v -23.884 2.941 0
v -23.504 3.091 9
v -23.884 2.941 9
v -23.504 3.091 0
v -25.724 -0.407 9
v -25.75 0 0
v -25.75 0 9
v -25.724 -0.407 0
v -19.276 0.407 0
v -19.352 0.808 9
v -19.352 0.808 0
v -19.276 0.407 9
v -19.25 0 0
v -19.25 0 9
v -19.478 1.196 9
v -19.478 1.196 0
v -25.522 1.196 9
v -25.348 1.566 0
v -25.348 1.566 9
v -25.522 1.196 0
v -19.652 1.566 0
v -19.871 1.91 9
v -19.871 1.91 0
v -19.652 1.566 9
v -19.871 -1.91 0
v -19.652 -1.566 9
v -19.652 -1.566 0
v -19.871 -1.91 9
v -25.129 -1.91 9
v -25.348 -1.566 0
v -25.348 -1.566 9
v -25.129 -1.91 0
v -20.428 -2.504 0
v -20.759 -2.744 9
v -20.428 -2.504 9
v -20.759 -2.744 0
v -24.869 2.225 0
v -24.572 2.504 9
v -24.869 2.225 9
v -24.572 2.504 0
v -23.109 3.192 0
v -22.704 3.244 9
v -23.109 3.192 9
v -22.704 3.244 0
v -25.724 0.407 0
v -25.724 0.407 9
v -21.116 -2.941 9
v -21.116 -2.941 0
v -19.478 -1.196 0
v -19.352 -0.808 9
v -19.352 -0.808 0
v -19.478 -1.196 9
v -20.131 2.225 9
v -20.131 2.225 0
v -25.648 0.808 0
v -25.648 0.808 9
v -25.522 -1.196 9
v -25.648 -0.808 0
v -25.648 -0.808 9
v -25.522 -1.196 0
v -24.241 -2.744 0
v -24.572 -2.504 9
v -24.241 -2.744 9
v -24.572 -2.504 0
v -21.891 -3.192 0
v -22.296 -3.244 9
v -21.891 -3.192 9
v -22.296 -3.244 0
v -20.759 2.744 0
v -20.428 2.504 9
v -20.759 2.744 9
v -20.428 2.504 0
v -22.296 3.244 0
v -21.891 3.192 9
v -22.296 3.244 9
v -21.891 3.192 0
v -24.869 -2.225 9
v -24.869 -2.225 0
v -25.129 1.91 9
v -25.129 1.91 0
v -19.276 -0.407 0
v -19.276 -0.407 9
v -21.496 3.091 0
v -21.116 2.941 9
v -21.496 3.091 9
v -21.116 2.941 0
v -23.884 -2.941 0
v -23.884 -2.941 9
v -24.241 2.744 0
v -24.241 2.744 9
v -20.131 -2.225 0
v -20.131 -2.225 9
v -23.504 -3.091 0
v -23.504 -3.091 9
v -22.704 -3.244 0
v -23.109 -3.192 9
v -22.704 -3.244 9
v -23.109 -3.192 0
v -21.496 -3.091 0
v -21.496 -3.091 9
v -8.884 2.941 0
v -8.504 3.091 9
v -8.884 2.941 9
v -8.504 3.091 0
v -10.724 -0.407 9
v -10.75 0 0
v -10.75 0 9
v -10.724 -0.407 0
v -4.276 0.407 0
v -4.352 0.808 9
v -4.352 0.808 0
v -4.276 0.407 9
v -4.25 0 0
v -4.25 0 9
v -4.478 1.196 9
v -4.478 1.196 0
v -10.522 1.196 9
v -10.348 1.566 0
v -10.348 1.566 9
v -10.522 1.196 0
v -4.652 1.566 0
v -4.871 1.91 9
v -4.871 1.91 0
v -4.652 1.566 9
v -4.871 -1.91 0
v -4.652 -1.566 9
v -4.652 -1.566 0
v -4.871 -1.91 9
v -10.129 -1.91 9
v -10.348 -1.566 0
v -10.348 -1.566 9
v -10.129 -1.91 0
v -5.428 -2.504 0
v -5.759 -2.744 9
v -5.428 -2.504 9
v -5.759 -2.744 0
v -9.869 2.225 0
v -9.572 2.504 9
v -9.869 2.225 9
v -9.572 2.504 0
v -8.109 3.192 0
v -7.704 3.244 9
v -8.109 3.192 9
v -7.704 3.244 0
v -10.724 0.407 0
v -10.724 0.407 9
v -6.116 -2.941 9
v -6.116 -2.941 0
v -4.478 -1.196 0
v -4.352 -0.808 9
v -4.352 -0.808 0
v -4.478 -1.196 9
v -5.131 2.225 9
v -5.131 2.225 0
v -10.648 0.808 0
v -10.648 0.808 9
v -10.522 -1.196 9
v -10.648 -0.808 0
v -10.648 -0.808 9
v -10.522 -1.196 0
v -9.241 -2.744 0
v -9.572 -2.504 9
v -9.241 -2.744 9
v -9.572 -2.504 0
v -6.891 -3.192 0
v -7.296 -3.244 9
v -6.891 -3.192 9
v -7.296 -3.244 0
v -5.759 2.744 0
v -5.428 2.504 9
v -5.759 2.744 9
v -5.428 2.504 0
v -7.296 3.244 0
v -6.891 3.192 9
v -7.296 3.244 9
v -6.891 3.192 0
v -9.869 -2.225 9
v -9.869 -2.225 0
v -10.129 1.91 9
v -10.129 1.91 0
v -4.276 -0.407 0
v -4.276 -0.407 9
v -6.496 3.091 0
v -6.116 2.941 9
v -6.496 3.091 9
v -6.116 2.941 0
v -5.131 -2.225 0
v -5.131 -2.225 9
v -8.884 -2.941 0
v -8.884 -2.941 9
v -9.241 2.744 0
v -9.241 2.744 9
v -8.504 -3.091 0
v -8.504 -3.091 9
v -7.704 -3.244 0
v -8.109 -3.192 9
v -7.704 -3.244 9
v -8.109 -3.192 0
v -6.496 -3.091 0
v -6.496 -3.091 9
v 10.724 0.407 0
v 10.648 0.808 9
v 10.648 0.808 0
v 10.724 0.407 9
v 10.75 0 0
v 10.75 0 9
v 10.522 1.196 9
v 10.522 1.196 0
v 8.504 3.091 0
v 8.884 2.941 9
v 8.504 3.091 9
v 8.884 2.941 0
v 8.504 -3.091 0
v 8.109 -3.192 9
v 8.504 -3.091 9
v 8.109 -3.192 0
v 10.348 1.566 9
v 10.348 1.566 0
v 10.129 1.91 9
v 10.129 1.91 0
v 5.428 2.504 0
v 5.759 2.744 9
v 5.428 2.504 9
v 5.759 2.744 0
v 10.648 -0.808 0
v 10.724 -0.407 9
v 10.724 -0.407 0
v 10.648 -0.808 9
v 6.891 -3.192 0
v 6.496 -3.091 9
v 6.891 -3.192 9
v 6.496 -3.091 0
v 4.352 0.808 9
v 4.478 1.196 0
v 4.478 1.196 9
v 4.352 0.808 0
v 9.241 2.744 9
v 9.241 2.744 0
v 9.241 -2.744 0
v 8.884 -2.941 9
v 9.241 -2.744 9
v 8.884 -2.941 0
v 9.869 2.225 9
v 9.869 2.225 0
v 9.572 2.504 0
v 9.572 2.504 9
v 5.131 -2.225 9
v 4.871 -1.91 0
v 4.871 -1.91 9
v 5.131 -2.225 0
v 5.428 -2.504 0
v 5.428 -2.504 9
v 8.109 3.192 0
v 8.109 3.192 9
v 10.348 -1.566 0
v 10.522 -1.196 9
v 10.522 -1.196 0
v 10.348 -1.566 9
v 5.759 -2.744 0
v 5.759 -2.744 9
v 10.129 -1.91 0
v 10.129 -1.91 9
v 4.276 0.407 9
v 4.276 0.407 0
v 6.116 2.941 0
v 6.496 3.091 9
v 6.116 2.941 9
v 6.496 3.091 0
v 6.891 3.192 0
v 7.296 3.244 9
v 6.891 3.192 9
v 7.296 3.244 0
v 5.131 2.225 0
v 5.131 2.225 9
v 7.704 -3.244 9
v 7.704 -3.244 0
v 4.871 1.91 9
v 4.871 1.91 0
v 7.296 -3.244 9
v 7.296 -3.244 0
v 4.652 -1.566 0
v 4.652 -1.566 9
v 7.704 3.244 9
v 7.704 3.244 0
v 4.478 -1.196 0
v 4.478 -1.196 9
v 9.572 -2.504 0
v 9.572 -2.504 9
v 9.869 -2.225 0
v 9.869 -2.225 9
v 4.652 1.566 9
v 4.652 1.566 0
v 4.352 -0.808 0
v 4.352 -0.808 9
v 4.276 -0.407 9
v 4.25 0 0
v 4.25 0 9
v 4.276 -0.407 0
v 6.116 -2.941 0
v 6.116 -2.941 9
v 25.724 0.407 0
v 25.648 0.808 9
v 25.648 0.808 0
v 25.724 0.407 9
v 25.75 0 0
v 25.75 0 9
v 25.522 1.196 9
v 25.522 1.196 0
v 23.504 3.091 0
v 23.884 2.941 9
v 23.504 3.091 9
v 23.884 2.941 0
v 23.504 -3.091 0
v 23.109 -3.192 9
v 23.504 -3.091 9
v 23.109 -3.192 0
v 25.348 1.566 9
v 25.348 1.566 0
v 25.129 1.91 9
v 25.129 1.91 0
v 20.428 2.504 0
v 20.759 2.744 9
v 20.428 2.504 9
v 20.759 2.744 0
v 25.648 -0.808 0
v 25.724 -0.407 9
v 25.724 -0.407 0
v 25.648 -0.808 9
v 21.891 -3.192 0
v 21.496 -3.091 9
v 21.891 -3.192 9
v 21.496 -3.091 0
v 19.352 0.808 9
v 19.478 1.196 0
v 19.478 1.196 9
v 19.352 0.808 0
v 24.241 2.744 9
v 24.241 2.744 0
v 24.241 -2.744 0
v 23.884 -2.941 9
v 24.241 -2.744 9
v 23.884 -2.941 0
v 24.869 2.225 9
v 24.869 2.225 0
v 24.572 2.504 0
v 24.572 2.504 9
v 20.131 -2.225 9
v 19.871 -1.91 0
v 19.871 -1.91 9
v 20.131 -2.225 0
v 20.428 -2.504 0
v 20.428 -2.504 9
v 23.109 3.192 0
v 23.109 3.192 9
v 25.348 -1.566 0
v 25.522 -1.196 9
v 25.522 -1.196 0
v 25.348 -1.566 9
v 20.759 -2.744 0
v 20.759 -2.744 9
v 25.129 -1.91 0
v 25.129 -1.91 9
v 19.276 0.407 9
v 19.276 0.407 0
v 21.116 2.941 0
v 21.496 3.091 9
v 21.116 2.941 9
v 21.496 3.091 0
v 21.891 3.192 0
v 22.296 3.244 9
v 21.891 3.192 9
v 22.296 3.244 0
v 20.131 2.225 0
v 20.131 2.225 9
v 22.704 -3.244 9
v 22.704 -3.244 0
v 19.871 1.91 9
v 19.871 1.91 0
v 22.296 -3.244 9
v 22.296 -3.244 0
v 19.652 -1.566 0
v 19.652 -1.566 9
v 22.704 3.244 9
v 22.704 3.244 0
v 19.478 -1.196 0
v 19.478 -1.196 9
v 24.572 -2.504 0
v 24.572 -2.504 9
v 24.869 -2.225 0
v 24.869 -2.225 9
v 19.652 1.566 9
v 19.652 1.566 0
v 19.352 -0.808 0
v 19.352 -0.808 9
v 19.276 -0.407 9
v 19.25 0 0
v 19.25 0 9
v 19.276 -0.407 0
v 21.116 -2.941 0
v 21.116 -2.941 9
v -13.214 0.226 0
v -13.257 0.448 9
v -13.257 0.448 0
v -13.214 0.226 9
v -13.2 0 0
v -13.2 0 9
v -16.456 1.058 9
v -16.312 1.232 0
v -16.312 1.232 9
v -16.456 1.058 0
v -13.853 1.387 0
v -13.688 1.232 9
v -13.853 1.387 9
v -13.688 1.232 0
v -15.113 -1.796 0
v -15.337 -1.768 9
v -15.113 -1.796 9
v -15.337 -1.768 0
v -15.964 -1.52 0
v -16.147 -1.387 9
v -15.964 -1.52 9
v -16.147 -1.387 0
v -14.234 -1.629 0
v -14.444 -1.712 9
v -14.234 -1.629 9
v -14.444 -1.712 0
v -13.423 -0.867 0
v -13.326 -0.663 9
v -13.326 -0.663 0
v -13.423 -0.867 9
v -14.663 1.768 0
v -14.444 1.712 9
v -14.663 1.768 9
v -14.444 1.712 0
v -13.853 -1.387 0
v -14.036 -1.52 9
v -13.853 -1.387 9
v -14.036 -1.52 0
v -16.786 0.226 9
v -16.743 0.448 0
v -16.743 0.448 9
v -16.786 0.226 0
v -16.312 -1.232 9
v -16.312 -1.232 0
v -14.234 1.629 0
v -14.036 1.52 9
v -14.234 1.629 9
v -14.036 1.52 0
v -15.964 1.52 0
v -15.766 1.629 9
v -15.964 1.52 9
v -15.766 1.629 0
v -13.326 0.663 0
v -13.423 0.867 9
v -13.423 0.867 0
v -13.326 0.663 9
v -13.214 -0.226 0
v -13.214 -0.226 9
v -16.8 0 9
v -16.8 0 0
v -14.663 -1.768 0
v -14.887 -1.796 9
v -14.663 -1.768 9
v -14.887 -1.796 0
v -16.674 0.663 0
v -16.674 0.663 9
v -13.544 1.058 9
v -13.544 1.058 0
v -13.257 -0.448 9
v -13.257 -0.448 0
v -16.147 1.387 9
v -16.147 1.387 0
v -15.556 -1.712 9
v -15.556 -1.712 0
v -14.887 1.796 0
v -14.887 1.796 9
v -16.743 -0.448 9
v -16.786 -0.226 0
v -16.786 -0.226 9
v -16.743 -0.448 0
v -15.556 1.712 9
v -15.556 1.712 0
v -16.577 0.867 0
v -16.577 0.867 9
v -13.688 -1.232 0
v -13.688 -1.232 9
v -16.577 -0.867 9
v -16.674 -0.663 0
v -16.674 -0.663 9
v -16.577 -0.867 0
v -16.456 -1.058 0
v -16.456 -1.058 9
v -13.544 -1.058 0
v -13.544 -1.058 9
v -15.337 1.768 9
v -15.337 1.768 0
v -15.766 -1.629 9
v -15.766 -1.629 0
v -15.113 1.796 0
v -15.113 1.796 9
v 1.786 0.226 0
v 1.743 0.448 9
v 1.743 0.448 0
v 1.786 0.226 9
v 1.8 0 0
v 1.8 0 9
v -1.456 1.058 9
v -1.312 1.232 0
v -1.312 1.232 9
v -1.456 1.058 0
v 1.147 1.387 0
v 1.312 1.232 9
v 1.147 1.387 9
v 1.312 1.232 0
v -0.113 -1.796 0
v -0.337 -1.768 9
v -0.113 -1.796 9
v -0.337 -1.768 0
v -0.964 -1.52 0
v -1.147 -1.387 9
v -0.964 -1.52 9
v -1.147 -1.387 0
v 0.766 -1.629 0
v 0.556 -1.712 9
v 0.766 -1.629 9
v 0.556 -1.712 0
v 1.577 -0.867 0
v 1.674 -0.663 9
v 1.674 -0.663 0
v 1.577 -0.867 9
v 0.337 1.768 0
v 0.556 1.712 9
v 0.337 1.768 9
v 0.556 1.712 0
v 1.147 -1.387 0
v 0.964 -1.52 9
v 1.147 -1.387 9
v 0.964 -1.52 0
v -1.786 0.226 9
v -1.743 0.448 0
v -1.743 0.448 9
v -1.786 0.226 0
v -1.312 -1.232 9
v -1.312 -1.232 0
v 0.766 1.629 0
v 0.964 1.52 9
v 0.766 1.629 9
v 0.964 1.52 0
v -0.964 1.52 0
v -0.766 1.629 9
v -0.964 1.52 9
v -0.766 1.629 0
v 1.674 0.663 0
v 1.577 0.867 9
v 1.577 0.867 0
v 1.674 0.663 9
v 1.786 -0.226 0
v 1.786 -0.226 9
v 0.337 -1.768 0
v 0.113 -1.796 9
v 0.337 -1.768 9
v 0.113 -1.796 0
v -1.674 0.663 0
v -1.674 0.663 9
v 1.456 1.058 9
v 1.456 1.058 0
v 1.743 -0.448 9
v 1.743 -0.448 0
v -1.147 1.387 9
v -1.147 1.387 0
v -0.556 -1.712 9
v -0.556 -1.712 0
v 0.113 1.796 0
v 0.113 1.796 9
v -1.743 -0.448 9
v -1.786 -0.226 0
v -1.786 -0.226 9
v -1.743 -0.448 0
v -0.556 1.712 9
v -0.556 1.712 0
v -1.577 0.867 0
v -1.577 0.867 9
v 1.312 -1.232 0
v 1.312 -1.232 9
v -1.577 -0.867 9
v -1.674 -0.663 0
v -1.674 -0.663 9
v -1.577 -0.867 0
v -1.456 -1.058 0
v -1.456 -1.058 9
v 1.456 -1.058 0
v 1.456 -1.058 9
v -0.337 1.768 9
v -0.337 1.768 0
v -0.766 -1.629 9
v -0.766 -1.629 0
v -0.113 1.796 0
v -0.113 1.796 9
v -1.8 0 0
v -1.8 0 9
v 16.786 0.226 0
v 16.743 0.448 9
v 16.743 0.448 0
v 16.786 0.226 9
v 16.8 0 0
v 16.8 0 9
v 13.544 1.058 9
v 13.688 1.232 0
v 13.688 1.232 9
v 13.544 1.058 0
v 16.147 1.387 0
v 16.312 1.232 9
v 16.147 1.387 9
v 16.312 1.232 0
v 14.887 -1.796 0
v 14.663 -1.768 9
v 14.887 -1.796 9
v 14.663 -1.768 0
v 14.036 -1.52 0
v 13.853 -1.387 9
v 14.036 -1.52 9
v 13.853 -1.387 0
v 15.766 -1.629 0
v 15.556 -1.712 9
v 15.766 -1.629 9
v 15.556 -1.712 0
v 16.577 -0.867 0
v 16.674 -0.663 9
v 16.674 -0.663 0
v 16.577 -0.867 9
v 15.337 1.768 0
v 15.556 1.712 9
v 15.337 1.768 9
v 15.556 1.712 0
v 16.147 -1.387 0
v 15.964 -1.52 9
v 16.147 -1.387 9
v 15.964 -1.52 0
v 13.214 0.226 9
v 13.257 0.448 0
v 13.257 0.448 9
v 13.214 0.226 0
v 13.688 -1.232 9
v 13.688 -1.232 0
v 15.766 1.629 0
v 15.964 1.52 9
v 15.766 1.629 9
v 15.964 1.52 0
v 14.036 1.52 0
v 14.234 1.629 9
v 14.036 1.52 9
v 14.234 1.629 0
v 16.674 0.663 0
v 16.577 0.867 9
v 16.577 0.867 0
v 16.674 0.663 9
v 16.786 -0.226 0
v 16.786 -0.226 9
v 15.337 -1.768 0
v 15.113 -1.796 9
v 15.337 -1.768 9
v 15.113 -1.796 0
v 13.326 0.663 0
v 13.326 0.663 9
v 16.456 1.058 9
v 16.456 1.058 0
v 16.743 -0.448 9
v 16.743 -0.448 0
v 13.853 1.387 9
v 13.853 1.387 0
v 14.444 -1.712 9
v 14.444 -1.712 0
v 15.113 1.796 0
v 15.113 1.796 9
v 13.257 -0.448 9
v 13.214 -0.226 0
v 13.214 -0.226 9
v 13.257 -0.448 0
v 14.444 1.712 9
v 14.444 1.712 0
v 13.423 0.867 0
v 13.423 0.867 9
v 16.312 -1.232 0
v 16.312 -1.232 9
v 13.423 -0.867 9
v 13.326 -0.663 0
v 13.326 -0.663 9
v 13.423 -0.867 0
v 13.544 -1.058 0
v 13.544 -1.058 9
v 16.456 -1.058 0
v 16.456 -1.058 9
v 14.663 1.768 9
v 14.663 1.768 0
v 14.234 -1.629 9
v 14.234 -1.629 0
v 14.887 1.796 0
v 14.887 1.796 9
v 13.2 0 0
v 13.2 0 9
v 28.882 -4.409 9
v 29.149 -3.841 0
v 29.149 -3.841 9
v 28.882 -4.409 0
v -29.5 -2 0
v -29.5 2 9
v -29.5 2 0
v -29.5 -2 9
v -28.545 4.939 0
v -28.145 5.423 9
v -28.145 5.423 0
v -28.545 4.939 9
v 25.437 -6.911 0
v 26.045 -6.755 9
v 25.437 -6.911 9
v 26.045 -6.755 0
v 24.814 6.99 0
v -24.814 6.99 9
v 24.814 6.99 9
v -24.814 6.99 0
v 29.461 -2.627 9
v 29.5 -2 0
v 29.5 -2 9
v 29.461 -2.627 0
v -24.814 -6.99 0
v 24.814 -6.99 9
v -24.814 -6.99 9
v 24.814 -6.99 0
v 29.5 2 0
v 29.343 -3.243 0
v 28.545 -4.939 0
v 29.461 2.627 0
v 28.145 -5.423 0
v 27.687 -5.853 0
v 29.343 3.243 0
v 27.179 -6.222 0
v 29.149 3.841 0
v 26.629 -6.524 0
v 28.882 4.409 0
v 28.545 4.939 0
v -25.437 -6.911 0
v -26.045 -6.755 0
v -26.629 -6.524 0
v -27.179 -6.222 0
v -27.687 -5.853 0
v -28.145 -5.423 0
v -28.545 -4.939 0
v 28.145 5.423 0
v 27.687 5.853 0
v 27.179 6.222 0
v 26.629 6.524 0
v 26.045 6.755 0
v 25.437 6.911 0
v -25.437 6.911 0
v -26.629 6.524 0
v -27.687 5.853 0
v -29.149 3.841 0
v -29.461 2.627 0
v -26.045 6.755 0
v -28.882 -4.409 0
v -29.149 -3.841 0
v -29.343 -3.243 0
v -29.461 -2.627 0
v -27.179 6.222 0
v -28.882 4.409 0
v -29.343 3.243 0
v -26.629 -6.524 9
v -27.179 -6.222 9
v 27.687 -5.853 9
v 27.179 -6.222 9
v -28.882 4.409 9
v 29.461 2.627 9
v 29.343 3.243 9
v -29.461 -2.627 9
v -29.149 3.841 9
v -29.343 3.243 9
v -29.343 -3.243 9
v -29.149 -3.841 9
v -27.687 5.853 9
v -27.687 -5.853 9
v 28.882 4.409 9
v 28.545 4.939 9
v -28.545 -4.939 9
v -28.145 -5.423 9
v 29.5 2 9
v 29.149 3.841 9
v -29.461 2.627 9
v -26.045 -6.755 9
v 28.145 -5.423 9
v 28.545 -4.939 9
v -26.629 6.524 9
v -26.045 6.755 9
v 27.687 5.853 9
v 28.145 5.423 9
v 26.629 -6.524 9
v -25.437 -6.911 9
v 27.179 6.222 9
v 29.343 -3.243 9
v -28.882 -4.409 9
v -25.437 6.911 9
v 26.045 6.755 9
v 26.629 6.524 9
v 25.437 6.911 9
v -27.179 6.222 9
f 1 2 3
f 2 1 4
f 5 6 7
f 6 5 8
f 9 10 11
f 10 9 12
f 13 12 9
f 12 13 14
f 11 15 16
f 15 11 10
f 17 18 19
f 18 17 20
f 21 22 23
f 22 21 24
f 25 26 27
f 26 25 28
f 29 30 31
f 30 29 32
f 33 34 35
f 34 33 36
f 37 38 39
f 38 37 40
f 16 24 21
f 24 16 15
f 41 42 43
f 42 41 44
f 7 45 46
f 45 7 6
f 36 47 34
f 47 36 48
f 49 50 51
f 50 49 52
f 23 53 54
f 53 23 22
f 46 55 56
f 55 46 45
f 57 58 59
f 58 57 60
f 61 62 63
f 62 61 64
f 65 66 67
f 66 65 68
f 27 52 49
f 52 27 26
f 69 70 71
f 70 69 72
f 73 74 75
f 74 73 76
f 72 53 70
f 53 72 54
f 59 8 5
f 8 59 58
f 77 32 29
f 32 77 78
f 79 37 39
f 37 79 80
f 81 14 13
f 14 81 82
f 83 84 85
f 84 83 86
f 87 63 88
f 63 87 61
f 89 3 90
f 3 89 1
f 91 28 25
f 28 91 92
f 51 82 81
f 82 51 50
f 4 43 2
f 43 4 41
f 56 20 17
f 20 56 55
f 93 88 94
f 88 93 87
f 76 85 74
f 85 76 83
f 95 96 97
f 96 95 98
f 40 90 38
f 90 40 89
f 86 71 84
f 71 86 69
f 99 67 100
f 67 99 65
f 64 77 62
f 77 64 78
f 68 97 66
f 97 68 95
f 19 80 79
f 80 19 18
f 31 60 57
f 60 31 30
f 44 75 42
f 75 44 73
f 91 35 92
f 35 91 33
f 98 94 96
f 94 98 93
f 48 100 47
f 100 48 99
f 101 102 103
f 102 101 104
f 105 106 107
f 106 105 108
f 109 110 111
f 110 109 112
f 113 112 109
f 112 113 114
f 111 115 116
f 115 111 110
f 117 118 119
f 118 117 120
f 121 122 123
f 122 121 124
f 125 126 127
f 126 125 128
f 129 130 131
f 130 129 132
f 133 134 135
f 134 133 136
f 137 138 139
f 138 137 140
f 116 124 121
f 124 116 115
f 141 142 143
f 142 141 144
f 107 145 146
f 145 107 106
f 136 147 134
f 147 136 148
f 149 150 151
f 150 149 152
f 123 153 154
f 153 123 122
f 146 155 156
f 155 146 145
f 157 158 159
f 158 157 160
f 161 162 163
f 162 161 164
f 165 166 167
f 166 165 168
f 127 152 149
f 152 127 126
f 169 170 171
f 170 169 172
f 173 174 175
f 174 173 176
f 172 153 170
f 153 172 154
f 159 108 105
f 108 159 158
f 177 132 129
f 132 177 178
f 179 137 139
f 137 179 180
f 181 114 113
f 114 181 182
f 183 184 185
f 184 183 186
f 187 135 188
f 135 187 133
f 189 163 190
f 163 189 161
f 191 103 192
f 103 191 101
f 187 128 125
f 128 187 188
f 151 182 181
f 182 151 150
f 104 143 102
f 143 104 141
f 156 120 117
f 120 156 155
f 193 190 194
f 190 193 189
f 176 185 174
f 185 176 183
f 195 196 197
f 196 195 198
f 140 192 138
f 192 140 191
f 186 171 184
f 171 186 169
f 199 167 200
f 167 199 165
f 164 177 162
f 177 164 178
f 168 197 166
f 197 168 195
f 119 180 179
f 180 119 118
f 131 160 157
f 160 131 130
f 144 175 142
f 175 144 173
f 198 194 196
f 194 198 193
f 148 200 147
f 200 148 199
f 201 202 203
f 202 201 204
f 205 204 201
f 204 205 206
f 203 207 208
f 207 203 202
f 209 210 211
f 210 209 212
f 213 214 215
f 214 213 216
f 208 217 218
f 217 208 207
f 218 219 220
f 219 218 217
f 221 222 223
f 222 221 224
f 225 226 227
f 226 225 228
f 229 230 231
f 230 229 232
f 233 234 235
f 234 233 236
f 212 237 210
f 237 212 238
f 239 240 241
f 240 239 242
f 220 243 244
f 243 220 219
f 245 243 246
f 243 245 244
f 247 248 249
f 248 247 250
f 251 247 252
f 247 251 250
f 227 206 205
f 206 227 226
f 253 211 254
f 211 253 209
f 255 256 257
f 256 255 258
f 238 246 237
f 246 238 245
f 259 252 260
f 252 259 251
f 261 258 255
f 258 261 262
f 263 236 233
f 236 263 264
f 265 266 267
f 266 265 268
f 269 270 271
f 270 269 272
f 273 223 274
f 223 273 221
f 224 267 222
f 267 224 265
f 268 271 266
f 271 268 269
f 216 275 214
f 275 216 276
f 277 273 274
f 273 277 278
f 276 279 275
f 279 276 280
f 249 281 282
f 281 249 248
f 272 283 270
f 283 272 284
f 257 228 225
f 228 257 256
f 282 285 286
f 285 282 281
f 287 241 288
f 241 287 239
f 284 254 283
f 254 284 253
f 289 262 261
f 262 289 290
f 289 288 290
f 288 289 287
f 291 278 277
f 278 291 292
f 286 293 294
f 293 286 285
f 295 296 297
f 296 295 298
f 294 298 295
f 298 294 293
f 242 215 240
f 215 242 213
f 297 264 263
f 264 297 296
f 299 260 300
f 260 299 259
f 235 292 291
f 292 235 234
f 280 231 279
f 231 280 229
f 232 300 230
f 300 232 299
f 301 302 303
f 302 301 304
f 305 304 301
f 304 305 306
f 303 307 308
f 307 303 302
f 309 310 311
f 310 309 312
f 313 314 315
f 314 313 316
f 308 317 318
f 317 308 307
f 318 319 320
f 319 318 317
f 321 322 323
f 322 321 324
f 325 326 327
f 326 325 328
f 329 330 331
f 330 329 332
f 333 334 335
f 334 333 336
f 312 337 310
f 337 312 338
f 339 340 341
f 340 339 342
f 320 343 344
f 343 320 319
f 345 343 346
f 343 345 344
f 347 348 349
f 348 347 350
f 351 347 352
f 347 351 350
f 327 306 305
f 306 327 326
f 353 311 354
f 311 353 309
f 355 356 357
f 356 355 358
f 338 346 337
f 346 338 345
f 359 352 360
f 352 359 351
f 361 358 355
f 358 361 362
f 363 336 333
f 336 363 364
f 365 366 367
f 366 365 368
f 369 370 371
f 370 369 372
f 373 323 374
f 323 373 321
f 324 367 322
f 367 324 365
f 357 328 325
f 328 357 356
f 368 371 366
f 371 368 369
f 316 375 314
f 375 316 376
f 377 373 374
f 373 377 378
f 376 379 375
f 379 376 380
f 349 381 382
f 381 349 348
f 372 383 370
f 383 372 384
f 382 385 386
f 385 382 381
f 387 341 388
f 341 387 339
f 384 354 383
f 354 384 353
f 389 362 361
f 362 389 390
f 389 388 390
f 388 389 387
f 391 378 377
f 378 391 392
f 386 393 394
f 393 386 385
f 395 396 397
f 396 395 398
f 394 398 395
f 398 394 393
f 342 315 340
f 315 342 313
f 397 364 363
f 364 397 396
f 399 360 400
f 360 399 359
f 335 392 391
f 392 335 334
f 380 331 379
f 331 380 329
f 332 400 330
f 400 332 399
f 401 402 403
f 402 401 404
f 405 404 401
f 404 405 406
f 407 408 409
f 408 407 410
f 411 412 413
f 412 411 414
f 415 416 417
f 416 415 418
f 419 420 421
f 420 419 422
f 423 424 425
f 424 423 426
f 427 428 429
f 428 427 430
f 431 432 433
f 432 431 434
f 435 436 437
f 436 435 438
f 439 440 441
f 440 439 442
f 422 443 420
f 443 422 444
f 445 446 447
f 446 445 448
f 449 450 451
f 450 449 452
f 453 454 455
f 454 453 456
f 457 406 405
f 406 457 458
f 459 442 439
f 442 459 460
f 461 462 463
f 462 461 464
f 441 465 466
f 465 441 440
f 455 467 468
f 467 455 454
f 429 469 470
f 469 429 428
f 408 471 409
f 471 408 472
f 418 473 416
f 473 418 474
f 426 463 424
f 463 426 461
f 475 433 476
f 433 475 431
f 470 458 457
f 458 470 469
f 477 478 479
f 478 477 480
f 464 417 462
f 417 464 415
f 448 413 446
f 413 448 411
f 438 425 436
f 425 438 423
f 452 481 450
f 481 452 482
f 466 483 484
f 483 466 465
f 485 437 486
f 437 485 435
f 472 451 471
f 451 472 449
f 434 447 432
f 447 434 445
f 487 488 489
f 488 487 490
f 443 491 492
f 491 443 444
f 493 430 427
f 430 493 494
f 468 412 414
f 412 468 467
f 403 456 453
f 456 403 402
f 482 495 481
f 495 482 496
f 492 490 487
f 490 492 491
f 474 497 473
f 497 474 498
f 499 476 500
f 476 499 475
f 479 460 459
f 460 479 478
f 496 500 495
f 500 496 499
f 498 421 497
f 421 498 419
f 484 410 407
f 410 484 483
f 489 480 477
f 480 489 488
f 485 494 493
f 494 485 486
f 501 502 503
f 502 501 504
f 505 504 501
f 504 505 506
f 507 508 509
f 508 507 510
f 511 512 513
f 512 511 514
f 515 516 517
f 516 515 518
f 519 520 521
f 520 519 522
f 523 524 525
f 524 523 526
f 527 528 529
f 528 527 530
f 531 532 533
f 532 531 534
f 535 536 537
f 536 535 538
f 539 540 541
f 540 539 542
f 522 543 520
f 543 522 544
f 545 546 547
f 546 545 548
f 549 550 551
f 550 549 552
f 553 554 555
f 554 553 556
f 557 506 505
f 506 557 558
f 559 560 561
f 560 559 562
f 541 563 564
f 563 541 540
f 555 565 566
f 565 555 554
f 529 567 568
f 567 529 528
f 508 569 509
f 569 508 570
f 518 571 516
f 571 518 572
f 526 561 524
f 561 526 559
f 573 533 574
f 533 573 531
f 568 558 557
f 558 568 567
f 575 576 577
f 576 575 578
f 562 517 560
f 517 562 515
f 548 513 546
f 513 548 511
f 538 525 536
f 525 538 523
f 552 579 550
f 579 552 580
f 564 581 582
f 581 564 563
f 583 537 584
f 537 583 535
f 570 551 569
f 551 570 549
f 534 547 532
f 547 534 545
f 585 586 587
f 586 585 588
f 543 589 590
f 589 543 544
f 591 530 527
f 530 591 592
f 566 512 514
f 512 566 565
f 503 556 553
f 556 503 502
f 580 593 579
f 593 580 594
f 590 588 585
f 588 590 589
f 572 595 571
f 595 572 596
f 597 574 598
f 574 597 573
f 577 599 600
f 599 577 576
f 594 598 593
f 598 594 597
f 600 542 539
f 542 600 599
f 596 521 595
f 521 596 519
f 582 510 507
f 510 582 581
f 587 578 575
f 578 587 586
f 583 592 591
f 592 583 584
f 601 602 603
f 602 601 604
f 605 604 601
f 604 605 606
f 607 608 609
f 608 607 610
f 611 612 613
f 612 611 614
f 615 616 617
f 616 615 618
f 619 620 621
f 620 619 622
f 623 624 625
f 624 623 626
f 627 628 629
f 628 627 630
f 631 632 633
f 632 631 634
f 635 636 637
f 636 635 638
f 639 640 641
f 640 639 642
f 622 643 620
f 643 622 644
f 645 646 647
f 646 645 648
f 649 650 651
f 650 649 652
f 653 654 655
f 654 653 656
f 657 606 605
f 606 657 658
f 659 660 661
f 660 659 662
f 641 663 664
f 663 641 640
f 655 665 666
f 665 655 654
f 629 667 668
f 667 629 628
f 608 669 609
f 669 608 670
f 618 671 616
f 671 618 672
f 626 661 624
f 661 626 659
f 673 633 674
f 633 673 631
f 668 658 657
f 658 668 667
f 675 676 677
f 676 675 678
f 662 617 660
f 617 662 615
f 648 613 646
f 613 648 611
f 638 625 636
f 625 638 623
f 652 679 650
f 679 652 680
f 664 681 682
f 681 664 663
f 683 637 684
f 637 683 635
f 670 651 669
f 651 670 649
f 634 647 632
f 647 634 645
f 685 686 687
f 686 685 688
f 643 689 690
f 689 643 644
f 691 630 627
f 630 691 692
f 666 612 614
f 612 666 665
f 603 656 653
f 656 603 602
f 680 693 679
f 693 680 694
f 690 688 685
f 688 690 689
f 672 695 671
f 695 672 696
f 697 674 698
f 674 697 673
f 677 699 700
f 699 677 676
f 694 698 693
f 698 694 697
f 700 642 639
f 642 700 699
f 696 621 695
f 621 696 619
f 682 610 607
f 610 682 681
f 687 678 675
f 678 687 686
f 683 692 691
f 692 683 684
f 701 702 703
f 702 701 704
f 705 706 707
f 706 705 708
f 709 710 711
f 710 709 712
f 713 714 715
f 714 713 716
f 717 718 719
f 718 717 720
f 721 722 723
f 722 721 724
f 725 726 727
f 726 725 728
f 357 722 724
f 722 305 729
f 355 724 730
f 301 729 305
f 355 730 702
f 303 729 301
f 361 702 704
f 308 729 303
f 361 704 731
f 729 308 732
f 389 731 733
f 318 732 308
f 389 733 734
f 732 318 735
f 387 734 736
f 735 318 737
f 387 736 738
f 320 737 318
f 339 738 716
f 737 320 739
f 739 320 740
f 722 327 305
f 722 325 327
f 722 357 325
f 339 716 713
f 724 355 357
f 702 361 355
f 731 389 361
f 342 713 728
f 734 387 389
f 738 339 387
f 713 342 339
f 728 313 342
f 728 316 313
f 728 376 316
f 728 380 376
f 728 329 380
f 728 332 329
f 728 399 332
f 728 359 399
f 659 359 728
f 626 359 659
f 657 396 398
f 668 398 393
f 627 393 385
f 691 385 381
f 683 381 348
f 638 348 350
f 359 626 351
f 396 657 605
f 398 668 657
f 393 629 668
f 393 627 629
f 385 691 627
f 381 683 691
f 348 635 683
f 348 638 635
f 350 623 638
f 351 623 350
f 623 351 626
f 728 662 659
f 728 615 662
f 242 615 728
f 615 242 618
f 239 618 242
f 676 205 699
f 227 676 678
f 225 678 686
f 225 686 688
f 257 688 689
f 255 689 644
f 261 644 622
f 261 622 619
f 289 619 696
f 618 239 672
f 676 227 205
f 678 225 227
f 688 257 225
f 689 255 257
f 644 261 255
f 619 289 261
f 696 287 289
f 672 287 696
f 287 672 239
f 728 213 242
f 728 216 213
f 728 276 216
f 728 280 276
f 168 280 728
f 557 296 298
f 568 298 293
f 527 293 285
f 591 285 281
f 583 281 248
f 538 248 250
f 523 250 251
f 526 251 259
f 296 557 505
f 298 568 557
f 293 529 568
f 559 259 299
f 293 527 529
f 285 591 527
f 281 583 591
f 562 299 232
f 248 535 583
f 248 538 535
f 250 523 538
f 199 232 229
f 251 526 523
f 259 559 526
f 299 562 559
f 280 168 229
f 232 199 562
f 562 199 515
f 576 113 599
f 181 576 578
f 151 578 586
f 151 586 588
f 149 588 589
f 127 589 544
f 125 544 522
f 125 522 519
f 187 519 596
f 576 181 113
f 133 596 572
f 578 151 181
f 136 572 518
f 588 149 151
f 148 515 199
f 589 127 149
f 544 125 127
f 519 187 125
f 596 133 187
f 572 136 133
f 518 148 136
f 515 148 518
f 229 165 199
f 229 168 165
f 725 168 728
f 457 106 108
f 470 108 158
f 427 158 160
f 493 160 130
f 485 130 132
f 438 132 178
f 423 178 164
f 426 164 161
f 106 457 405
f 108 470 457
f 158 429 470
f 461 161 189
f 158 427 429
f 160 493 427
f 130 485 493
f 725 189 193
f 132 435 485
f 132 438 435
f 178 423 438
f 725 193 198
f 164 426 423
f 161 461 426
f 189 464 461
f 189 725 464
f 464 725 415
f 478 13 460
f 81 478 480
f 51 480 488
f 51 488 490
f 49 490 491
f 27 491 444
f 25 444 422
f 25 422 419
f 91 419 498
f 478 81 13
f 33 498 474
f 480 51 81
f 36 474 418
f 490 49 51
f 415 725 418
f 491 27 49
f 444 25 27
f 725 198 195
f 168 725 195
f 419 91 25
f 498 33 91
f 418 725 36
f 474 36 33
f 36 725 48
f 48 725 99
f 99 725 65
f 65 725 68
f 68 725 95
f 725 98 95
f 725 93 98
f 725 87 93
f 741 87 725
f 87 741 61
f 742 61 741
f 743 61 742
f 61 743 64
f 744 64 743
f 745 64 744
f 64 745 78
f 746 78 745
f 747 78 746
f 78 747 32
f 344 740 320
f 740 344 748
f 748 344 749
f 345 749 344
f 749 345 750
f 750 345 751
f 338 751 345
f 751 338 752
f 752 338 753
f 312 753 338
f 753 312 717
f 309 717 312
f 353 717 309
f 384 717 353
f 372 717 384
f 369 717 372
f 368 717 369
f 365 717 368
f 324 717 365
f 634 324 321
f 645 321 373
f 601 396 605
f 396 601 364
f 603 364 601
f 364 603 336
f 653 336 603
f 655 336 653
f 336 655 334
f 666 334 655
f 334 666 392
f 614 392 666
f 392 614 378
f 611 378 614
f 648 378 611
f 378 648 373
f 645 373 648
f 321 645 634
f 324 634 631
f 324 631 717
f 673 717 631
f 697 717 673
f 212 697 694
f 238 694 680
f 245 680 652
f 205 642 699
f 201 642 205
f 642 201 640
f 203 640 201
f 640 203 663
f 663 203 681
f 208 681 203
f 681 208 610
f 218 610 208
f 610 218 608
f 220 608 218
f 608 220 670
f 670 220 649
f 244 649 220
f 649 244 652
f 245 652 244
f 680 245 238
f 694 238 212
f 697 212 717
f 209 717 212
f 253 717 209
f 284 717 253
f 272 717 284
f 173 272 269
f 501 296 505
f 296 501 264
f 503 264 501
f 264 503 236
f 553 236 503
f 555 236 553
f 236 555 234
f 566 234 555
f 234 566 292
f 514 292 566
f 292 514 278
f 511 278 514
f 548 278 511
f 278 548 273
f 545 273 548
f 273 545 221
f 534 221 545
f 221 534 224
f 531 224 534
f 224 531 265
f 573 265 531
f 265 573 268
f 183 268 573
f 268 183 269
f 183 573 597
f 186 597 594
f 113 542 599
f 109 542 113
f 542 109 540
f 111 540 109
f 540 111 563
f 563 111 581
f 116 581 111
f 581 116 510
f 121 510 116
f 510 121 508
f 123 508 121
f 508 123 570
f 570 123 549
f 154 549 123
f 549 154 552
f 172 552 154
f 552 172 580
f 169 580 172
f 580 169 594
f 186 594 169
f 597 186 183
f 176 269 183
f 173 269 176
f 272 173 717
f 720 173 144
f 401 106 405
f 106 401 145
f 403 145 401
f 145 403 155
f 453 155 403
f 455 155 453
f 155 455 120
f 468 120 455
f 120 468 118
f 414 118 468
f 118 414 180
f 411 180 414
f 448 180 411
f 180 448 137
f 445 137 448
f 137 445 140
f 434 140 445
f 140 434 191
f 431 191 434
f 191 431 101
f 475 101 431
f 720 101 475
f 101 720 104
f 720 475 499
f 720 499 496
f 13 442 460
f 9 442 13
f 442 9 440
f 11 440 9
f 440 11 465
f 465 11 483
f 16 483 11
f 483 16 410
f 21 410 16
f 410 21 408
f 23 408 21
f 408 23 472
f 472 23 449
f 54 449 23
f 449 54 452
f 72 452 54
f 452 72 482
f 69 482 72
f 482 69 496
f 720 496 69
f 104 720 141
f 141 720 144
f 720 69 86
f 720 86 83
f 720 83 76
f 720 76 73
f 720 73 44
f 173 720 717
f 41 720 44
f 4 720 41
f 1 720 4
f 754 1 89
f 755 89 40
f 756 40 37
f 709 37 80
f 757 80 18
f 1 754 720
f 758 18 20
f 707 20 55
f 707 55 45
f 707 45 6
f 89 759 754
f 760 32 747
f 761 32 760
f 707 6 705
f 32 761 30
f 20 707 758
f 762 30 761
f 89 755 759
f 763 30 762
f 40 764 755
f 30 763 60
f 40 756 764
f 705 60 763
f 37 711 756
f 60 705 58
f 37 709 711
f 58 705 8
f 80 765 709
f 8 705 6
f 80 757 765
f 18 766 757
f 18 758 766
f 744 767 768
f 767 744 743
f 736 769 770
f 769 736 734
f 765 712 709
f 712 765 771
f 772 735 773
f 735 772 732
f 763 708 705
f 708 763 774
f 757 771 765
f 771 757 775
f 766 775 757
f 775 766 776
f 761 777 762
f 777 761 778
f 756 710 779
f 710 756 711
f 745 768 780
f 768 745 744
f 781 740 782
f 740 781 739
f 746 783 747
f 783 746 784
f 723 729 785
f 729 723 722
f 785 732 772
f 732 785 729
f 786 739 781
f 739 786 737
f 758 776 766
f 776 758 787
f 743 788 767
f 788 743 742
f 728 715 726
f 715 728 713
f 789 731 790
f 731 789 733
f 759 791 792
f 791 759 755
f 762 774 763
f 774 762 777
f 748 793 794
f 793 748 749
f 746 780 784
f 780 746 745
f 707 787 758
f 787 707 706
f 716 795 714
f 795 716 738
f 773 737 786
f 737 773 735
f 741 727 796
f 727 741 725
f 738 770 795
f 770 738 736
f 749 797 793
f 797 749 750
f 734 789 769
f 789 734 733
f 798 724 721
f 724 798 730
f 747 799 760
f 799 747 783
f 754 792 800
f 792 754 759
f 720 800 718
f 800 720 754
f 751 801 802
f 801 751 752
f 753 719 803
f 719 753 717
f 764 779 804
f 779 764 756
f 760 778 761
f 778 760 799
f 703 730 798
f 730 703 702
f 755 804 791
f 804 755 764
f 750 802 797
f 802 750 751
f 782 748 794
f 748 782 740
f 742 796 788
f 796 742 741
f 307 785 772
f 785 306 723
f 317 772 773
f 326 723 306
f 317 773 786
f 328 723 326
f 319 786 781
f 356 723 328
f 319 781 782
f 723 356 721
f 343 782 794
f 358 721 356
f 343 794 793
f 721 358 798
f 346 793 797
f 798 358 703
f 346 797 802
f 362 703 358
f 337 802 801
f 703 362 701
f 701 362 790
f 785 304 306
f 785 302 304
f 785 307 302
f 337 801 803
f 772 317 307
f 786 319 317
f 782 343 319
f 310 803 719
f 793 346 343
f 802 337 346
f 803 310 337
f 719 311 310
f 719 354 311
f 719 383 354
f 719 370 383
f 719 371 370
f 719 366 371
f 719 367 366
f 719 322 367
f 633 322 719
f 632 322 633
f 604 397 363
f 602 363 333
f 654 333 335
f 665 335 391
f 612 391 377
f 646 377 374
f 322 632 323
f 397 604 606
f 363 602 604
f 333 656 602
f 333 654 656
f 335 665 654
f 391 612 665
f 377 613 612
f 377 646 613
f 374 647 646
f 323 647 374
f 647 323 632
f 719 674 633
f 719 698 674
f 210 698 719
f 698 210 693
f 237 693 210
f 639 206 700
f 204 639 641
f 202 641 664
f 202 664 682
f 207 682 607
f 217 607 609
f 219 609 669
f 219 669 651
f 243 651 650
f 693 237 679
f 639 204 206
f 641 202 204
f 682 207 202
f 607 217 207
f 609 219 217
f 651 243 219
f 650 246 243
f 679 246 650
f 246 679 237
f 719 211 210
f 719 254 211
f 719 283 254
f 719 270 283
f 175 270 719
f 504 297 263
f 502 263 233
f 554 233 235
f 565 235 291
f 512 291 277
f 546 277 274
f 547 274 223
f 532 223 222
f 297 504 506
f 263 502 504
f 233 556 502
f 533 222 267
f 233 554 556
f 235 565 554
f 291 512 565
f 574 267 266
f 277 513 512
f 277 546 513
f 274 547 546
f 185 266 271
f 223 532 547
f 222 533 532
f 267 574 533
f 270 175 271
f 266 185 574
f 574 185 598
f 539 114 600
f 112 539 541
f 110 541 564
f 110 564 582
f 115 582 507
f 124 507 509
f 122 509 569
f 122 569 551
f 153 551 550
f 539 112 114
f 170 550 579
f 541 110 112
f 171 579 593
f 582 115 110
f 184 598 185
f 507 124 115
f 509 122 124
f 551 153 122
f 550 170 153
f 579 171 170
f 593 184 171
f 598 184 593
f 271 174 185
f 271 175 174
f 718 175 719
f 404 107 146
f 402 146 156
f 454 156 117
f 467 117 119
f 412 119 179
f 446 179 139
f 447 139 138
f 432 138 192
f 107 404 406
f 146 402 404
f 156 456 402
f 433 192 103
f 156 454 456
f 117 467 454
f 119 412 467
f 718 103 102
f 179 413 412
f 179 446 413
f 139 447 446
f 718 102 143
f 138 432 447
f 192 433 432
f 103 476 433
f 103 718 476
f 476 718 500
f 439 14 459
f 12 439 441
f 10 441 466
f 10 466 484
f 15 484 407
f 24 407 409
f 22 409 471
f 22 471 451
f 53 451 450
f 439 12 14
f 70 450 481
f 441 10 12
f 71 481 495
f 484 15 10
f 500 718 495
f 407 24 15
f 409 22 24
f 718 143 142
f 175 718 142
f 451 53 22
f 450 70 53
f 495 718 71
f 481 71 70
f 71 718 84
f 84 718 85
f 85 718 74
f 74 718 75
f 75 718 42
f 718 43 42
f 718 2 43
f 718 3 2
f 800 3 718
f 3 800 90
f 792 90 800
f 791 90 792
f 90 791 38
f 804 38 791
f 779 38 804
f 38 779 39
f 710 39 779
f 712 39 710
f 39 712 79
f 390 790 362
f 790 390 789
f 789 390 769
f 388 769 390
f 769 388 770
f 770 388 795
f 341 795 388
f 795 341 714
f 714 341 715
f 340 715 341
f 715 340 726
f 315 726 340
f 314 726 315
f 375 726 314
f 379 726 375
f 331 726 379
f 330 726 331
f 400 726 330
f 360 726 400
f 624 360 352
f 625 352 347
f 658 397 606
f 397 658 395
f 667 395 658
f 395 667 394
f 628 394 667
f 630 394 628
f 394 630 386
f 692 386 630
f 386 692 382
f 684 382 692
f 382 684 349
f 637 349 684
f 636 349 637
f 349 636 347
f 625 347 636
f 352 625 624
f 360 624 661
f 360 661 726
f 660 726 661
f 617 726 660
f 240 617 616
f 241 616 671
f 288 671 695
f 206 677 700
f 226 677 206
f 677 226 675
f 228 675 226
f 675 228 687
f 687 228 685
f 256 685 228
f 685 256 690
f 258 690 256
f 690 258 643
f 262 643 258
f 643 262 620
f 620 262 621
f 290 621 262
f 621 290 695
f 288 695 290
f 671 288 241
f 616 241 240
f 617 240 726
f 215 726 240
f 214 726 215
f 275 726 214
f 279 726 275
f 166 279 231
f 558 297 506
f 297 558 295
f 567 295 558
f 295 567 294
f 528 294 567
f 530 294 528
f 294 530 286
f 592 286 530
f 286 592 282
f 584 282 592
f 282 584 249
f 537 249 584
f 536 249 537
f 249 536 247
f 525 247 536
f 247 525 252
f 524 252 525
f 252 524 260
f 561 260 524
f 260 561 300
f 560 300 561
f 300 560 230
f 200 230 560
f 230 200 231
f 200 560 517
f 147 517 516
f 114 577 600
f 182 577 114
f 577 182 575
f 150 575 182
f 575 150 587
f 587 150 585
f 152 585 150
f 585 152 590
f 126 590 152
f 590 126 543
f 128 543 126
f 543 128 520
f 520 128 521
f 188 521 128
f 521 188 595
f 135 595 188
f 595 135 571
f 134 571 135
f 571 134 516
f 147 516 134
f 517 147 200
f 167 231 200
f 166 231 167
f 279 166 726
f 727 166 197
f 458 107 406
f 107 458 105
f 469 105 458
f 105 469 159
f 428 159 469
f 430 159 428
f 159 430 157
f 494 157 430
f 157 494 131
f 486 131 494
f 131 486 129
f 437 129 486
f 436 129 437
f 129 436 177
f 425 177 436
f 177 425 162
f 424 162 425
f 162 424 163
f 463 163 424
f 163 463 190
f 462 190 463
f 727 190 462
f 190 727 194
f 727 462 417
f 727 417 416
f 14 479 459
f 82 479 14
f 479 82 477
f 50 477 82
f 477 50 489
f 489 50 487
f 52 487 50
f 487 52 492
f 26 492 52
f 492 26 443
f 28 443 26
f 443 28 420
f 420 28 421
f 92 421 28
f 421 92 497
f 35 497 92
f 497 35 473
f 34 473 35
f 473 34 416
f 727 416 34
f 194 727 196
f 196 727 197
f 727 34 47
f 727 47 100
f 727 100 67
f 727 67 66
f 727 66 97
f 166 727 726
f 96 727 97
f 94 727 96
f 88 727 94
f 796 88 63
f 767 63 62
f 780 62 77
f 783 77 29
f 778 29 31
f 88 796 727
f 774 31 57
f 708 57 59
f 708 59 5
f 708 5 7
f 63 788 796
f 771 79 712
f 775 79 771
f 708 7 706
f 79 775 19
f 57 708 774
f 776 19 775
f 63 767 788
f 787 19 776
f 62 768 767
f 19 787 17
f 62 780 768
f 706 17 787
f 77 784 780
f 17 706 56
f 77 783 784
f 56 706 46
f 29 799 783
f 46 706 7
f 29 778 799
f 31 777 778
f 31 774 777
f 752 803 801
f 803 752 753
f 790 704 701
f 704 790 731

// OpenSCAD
$fn = 50;


difference() {
	union() {
		*color(alpha = 1.0000000000, c = "gray") {
			translate(v = [0, 7, 0]) {
				linear_extrude(height = 1) {
					text(font = "Arial:style=Bold", halign = "center", size = 4.5000000000, text = "COMMENT plate main", valign = "center");
				}
			}
		}
		hull() {
			translate(v = [-24.5000000000, 2.0000000000, 0]) {
				cylinder(h = 9, r = 5);
			}
			translate(v = [24.5000000000, 2.0000000000, 0]) {
				cylinder(h = 9, r = 5);
			}
			translate(v = [-24.5000000000, -2.0000000000, 0]) {
				cylinder(h = 9, r = 5);
			}
			translate(v = [24.5000000000, -2.0000000000, 0]) {
				cylinder(h = 9, r = 5);
			}
		}
	}
	union() {
		*color(alpha = 1.0000000000, c = "gray") {
			translate(v = [0, 7, 0]) {
				linear_extrude(height = 1) {
					text(font = "Arial:style=Bold", halign = "center", size = 4.5000000000, text = "COMMENT holes main", valign = "center");
				}
			}
		}
		translate(v = [-22.5000000000, 0.0000000000, 0]) {
			translate(v = [0, 0, -100]) {
				cylinder(h = 200, r = 3.2500000000);
			}
		}
		translate(v = [-7.5000000000, 0.0000000000, 0]) {
			translate(v = [0, 0, -100]) {
				cylinder(h = 200, r = 3.2500000000);
			}
		}
		translate(v = [7.5000000000, 0.0000000000, 0]) {
			translate(v = [0, 0, -100]) {
				cylinder(h = 200, r = 3.2500000000);
			}
		}
		translate(v = [22.5000000000, 0.0000000000, 0]) {
			translate(v = [0, 0, -100]) {
				cylinder(h = 200, r = 3.2500000000);
			}
		}
		translate(v = [-22.5000000000, 0.0000000000, 0]) {
			translate(v = [0, 0, -100]) {
				cylinder(h = 200, r = 1.8000000000);
			}
		}
		translate(v = [-15.0000000000, 0.0000000000, 0]) {
			translate(v = [0, 0, -100]) {
				cylinder(h = 200, r = 1.8000000000);
			}
		}
		translate(v = [-7.5000000000, 0.0000000000, 0]) {
			translate(v = [0, 0, -100]) {
				cylinder(h = 200, r = 1.8000000000);
			}
		}
		translate(v = [0, 0, -100]) {
			cylinder(h = 200, r = 1.8000000000);
		}
		translate(v = [7.5000000000, 0.0000000000, 0]) {
			translate(v = [0, 0, -100]) {
				cylinder(h = 200, r = 1.8000000000);
			}
		}
		translate(v = [15.0000000000, 0.0000000000, 0]) {
			translate(v = [0, 0, -100]) {
				cylinder(h = 200, r = 1.8000000000);
			}
		}
		translate(v = [22.5000000000, 0.0000000000, 0]) {
			translate(v = [0, 0, -100]) {
				cylinder(h = 200, r = 1.8000000000);
			}
		}
	}
}
